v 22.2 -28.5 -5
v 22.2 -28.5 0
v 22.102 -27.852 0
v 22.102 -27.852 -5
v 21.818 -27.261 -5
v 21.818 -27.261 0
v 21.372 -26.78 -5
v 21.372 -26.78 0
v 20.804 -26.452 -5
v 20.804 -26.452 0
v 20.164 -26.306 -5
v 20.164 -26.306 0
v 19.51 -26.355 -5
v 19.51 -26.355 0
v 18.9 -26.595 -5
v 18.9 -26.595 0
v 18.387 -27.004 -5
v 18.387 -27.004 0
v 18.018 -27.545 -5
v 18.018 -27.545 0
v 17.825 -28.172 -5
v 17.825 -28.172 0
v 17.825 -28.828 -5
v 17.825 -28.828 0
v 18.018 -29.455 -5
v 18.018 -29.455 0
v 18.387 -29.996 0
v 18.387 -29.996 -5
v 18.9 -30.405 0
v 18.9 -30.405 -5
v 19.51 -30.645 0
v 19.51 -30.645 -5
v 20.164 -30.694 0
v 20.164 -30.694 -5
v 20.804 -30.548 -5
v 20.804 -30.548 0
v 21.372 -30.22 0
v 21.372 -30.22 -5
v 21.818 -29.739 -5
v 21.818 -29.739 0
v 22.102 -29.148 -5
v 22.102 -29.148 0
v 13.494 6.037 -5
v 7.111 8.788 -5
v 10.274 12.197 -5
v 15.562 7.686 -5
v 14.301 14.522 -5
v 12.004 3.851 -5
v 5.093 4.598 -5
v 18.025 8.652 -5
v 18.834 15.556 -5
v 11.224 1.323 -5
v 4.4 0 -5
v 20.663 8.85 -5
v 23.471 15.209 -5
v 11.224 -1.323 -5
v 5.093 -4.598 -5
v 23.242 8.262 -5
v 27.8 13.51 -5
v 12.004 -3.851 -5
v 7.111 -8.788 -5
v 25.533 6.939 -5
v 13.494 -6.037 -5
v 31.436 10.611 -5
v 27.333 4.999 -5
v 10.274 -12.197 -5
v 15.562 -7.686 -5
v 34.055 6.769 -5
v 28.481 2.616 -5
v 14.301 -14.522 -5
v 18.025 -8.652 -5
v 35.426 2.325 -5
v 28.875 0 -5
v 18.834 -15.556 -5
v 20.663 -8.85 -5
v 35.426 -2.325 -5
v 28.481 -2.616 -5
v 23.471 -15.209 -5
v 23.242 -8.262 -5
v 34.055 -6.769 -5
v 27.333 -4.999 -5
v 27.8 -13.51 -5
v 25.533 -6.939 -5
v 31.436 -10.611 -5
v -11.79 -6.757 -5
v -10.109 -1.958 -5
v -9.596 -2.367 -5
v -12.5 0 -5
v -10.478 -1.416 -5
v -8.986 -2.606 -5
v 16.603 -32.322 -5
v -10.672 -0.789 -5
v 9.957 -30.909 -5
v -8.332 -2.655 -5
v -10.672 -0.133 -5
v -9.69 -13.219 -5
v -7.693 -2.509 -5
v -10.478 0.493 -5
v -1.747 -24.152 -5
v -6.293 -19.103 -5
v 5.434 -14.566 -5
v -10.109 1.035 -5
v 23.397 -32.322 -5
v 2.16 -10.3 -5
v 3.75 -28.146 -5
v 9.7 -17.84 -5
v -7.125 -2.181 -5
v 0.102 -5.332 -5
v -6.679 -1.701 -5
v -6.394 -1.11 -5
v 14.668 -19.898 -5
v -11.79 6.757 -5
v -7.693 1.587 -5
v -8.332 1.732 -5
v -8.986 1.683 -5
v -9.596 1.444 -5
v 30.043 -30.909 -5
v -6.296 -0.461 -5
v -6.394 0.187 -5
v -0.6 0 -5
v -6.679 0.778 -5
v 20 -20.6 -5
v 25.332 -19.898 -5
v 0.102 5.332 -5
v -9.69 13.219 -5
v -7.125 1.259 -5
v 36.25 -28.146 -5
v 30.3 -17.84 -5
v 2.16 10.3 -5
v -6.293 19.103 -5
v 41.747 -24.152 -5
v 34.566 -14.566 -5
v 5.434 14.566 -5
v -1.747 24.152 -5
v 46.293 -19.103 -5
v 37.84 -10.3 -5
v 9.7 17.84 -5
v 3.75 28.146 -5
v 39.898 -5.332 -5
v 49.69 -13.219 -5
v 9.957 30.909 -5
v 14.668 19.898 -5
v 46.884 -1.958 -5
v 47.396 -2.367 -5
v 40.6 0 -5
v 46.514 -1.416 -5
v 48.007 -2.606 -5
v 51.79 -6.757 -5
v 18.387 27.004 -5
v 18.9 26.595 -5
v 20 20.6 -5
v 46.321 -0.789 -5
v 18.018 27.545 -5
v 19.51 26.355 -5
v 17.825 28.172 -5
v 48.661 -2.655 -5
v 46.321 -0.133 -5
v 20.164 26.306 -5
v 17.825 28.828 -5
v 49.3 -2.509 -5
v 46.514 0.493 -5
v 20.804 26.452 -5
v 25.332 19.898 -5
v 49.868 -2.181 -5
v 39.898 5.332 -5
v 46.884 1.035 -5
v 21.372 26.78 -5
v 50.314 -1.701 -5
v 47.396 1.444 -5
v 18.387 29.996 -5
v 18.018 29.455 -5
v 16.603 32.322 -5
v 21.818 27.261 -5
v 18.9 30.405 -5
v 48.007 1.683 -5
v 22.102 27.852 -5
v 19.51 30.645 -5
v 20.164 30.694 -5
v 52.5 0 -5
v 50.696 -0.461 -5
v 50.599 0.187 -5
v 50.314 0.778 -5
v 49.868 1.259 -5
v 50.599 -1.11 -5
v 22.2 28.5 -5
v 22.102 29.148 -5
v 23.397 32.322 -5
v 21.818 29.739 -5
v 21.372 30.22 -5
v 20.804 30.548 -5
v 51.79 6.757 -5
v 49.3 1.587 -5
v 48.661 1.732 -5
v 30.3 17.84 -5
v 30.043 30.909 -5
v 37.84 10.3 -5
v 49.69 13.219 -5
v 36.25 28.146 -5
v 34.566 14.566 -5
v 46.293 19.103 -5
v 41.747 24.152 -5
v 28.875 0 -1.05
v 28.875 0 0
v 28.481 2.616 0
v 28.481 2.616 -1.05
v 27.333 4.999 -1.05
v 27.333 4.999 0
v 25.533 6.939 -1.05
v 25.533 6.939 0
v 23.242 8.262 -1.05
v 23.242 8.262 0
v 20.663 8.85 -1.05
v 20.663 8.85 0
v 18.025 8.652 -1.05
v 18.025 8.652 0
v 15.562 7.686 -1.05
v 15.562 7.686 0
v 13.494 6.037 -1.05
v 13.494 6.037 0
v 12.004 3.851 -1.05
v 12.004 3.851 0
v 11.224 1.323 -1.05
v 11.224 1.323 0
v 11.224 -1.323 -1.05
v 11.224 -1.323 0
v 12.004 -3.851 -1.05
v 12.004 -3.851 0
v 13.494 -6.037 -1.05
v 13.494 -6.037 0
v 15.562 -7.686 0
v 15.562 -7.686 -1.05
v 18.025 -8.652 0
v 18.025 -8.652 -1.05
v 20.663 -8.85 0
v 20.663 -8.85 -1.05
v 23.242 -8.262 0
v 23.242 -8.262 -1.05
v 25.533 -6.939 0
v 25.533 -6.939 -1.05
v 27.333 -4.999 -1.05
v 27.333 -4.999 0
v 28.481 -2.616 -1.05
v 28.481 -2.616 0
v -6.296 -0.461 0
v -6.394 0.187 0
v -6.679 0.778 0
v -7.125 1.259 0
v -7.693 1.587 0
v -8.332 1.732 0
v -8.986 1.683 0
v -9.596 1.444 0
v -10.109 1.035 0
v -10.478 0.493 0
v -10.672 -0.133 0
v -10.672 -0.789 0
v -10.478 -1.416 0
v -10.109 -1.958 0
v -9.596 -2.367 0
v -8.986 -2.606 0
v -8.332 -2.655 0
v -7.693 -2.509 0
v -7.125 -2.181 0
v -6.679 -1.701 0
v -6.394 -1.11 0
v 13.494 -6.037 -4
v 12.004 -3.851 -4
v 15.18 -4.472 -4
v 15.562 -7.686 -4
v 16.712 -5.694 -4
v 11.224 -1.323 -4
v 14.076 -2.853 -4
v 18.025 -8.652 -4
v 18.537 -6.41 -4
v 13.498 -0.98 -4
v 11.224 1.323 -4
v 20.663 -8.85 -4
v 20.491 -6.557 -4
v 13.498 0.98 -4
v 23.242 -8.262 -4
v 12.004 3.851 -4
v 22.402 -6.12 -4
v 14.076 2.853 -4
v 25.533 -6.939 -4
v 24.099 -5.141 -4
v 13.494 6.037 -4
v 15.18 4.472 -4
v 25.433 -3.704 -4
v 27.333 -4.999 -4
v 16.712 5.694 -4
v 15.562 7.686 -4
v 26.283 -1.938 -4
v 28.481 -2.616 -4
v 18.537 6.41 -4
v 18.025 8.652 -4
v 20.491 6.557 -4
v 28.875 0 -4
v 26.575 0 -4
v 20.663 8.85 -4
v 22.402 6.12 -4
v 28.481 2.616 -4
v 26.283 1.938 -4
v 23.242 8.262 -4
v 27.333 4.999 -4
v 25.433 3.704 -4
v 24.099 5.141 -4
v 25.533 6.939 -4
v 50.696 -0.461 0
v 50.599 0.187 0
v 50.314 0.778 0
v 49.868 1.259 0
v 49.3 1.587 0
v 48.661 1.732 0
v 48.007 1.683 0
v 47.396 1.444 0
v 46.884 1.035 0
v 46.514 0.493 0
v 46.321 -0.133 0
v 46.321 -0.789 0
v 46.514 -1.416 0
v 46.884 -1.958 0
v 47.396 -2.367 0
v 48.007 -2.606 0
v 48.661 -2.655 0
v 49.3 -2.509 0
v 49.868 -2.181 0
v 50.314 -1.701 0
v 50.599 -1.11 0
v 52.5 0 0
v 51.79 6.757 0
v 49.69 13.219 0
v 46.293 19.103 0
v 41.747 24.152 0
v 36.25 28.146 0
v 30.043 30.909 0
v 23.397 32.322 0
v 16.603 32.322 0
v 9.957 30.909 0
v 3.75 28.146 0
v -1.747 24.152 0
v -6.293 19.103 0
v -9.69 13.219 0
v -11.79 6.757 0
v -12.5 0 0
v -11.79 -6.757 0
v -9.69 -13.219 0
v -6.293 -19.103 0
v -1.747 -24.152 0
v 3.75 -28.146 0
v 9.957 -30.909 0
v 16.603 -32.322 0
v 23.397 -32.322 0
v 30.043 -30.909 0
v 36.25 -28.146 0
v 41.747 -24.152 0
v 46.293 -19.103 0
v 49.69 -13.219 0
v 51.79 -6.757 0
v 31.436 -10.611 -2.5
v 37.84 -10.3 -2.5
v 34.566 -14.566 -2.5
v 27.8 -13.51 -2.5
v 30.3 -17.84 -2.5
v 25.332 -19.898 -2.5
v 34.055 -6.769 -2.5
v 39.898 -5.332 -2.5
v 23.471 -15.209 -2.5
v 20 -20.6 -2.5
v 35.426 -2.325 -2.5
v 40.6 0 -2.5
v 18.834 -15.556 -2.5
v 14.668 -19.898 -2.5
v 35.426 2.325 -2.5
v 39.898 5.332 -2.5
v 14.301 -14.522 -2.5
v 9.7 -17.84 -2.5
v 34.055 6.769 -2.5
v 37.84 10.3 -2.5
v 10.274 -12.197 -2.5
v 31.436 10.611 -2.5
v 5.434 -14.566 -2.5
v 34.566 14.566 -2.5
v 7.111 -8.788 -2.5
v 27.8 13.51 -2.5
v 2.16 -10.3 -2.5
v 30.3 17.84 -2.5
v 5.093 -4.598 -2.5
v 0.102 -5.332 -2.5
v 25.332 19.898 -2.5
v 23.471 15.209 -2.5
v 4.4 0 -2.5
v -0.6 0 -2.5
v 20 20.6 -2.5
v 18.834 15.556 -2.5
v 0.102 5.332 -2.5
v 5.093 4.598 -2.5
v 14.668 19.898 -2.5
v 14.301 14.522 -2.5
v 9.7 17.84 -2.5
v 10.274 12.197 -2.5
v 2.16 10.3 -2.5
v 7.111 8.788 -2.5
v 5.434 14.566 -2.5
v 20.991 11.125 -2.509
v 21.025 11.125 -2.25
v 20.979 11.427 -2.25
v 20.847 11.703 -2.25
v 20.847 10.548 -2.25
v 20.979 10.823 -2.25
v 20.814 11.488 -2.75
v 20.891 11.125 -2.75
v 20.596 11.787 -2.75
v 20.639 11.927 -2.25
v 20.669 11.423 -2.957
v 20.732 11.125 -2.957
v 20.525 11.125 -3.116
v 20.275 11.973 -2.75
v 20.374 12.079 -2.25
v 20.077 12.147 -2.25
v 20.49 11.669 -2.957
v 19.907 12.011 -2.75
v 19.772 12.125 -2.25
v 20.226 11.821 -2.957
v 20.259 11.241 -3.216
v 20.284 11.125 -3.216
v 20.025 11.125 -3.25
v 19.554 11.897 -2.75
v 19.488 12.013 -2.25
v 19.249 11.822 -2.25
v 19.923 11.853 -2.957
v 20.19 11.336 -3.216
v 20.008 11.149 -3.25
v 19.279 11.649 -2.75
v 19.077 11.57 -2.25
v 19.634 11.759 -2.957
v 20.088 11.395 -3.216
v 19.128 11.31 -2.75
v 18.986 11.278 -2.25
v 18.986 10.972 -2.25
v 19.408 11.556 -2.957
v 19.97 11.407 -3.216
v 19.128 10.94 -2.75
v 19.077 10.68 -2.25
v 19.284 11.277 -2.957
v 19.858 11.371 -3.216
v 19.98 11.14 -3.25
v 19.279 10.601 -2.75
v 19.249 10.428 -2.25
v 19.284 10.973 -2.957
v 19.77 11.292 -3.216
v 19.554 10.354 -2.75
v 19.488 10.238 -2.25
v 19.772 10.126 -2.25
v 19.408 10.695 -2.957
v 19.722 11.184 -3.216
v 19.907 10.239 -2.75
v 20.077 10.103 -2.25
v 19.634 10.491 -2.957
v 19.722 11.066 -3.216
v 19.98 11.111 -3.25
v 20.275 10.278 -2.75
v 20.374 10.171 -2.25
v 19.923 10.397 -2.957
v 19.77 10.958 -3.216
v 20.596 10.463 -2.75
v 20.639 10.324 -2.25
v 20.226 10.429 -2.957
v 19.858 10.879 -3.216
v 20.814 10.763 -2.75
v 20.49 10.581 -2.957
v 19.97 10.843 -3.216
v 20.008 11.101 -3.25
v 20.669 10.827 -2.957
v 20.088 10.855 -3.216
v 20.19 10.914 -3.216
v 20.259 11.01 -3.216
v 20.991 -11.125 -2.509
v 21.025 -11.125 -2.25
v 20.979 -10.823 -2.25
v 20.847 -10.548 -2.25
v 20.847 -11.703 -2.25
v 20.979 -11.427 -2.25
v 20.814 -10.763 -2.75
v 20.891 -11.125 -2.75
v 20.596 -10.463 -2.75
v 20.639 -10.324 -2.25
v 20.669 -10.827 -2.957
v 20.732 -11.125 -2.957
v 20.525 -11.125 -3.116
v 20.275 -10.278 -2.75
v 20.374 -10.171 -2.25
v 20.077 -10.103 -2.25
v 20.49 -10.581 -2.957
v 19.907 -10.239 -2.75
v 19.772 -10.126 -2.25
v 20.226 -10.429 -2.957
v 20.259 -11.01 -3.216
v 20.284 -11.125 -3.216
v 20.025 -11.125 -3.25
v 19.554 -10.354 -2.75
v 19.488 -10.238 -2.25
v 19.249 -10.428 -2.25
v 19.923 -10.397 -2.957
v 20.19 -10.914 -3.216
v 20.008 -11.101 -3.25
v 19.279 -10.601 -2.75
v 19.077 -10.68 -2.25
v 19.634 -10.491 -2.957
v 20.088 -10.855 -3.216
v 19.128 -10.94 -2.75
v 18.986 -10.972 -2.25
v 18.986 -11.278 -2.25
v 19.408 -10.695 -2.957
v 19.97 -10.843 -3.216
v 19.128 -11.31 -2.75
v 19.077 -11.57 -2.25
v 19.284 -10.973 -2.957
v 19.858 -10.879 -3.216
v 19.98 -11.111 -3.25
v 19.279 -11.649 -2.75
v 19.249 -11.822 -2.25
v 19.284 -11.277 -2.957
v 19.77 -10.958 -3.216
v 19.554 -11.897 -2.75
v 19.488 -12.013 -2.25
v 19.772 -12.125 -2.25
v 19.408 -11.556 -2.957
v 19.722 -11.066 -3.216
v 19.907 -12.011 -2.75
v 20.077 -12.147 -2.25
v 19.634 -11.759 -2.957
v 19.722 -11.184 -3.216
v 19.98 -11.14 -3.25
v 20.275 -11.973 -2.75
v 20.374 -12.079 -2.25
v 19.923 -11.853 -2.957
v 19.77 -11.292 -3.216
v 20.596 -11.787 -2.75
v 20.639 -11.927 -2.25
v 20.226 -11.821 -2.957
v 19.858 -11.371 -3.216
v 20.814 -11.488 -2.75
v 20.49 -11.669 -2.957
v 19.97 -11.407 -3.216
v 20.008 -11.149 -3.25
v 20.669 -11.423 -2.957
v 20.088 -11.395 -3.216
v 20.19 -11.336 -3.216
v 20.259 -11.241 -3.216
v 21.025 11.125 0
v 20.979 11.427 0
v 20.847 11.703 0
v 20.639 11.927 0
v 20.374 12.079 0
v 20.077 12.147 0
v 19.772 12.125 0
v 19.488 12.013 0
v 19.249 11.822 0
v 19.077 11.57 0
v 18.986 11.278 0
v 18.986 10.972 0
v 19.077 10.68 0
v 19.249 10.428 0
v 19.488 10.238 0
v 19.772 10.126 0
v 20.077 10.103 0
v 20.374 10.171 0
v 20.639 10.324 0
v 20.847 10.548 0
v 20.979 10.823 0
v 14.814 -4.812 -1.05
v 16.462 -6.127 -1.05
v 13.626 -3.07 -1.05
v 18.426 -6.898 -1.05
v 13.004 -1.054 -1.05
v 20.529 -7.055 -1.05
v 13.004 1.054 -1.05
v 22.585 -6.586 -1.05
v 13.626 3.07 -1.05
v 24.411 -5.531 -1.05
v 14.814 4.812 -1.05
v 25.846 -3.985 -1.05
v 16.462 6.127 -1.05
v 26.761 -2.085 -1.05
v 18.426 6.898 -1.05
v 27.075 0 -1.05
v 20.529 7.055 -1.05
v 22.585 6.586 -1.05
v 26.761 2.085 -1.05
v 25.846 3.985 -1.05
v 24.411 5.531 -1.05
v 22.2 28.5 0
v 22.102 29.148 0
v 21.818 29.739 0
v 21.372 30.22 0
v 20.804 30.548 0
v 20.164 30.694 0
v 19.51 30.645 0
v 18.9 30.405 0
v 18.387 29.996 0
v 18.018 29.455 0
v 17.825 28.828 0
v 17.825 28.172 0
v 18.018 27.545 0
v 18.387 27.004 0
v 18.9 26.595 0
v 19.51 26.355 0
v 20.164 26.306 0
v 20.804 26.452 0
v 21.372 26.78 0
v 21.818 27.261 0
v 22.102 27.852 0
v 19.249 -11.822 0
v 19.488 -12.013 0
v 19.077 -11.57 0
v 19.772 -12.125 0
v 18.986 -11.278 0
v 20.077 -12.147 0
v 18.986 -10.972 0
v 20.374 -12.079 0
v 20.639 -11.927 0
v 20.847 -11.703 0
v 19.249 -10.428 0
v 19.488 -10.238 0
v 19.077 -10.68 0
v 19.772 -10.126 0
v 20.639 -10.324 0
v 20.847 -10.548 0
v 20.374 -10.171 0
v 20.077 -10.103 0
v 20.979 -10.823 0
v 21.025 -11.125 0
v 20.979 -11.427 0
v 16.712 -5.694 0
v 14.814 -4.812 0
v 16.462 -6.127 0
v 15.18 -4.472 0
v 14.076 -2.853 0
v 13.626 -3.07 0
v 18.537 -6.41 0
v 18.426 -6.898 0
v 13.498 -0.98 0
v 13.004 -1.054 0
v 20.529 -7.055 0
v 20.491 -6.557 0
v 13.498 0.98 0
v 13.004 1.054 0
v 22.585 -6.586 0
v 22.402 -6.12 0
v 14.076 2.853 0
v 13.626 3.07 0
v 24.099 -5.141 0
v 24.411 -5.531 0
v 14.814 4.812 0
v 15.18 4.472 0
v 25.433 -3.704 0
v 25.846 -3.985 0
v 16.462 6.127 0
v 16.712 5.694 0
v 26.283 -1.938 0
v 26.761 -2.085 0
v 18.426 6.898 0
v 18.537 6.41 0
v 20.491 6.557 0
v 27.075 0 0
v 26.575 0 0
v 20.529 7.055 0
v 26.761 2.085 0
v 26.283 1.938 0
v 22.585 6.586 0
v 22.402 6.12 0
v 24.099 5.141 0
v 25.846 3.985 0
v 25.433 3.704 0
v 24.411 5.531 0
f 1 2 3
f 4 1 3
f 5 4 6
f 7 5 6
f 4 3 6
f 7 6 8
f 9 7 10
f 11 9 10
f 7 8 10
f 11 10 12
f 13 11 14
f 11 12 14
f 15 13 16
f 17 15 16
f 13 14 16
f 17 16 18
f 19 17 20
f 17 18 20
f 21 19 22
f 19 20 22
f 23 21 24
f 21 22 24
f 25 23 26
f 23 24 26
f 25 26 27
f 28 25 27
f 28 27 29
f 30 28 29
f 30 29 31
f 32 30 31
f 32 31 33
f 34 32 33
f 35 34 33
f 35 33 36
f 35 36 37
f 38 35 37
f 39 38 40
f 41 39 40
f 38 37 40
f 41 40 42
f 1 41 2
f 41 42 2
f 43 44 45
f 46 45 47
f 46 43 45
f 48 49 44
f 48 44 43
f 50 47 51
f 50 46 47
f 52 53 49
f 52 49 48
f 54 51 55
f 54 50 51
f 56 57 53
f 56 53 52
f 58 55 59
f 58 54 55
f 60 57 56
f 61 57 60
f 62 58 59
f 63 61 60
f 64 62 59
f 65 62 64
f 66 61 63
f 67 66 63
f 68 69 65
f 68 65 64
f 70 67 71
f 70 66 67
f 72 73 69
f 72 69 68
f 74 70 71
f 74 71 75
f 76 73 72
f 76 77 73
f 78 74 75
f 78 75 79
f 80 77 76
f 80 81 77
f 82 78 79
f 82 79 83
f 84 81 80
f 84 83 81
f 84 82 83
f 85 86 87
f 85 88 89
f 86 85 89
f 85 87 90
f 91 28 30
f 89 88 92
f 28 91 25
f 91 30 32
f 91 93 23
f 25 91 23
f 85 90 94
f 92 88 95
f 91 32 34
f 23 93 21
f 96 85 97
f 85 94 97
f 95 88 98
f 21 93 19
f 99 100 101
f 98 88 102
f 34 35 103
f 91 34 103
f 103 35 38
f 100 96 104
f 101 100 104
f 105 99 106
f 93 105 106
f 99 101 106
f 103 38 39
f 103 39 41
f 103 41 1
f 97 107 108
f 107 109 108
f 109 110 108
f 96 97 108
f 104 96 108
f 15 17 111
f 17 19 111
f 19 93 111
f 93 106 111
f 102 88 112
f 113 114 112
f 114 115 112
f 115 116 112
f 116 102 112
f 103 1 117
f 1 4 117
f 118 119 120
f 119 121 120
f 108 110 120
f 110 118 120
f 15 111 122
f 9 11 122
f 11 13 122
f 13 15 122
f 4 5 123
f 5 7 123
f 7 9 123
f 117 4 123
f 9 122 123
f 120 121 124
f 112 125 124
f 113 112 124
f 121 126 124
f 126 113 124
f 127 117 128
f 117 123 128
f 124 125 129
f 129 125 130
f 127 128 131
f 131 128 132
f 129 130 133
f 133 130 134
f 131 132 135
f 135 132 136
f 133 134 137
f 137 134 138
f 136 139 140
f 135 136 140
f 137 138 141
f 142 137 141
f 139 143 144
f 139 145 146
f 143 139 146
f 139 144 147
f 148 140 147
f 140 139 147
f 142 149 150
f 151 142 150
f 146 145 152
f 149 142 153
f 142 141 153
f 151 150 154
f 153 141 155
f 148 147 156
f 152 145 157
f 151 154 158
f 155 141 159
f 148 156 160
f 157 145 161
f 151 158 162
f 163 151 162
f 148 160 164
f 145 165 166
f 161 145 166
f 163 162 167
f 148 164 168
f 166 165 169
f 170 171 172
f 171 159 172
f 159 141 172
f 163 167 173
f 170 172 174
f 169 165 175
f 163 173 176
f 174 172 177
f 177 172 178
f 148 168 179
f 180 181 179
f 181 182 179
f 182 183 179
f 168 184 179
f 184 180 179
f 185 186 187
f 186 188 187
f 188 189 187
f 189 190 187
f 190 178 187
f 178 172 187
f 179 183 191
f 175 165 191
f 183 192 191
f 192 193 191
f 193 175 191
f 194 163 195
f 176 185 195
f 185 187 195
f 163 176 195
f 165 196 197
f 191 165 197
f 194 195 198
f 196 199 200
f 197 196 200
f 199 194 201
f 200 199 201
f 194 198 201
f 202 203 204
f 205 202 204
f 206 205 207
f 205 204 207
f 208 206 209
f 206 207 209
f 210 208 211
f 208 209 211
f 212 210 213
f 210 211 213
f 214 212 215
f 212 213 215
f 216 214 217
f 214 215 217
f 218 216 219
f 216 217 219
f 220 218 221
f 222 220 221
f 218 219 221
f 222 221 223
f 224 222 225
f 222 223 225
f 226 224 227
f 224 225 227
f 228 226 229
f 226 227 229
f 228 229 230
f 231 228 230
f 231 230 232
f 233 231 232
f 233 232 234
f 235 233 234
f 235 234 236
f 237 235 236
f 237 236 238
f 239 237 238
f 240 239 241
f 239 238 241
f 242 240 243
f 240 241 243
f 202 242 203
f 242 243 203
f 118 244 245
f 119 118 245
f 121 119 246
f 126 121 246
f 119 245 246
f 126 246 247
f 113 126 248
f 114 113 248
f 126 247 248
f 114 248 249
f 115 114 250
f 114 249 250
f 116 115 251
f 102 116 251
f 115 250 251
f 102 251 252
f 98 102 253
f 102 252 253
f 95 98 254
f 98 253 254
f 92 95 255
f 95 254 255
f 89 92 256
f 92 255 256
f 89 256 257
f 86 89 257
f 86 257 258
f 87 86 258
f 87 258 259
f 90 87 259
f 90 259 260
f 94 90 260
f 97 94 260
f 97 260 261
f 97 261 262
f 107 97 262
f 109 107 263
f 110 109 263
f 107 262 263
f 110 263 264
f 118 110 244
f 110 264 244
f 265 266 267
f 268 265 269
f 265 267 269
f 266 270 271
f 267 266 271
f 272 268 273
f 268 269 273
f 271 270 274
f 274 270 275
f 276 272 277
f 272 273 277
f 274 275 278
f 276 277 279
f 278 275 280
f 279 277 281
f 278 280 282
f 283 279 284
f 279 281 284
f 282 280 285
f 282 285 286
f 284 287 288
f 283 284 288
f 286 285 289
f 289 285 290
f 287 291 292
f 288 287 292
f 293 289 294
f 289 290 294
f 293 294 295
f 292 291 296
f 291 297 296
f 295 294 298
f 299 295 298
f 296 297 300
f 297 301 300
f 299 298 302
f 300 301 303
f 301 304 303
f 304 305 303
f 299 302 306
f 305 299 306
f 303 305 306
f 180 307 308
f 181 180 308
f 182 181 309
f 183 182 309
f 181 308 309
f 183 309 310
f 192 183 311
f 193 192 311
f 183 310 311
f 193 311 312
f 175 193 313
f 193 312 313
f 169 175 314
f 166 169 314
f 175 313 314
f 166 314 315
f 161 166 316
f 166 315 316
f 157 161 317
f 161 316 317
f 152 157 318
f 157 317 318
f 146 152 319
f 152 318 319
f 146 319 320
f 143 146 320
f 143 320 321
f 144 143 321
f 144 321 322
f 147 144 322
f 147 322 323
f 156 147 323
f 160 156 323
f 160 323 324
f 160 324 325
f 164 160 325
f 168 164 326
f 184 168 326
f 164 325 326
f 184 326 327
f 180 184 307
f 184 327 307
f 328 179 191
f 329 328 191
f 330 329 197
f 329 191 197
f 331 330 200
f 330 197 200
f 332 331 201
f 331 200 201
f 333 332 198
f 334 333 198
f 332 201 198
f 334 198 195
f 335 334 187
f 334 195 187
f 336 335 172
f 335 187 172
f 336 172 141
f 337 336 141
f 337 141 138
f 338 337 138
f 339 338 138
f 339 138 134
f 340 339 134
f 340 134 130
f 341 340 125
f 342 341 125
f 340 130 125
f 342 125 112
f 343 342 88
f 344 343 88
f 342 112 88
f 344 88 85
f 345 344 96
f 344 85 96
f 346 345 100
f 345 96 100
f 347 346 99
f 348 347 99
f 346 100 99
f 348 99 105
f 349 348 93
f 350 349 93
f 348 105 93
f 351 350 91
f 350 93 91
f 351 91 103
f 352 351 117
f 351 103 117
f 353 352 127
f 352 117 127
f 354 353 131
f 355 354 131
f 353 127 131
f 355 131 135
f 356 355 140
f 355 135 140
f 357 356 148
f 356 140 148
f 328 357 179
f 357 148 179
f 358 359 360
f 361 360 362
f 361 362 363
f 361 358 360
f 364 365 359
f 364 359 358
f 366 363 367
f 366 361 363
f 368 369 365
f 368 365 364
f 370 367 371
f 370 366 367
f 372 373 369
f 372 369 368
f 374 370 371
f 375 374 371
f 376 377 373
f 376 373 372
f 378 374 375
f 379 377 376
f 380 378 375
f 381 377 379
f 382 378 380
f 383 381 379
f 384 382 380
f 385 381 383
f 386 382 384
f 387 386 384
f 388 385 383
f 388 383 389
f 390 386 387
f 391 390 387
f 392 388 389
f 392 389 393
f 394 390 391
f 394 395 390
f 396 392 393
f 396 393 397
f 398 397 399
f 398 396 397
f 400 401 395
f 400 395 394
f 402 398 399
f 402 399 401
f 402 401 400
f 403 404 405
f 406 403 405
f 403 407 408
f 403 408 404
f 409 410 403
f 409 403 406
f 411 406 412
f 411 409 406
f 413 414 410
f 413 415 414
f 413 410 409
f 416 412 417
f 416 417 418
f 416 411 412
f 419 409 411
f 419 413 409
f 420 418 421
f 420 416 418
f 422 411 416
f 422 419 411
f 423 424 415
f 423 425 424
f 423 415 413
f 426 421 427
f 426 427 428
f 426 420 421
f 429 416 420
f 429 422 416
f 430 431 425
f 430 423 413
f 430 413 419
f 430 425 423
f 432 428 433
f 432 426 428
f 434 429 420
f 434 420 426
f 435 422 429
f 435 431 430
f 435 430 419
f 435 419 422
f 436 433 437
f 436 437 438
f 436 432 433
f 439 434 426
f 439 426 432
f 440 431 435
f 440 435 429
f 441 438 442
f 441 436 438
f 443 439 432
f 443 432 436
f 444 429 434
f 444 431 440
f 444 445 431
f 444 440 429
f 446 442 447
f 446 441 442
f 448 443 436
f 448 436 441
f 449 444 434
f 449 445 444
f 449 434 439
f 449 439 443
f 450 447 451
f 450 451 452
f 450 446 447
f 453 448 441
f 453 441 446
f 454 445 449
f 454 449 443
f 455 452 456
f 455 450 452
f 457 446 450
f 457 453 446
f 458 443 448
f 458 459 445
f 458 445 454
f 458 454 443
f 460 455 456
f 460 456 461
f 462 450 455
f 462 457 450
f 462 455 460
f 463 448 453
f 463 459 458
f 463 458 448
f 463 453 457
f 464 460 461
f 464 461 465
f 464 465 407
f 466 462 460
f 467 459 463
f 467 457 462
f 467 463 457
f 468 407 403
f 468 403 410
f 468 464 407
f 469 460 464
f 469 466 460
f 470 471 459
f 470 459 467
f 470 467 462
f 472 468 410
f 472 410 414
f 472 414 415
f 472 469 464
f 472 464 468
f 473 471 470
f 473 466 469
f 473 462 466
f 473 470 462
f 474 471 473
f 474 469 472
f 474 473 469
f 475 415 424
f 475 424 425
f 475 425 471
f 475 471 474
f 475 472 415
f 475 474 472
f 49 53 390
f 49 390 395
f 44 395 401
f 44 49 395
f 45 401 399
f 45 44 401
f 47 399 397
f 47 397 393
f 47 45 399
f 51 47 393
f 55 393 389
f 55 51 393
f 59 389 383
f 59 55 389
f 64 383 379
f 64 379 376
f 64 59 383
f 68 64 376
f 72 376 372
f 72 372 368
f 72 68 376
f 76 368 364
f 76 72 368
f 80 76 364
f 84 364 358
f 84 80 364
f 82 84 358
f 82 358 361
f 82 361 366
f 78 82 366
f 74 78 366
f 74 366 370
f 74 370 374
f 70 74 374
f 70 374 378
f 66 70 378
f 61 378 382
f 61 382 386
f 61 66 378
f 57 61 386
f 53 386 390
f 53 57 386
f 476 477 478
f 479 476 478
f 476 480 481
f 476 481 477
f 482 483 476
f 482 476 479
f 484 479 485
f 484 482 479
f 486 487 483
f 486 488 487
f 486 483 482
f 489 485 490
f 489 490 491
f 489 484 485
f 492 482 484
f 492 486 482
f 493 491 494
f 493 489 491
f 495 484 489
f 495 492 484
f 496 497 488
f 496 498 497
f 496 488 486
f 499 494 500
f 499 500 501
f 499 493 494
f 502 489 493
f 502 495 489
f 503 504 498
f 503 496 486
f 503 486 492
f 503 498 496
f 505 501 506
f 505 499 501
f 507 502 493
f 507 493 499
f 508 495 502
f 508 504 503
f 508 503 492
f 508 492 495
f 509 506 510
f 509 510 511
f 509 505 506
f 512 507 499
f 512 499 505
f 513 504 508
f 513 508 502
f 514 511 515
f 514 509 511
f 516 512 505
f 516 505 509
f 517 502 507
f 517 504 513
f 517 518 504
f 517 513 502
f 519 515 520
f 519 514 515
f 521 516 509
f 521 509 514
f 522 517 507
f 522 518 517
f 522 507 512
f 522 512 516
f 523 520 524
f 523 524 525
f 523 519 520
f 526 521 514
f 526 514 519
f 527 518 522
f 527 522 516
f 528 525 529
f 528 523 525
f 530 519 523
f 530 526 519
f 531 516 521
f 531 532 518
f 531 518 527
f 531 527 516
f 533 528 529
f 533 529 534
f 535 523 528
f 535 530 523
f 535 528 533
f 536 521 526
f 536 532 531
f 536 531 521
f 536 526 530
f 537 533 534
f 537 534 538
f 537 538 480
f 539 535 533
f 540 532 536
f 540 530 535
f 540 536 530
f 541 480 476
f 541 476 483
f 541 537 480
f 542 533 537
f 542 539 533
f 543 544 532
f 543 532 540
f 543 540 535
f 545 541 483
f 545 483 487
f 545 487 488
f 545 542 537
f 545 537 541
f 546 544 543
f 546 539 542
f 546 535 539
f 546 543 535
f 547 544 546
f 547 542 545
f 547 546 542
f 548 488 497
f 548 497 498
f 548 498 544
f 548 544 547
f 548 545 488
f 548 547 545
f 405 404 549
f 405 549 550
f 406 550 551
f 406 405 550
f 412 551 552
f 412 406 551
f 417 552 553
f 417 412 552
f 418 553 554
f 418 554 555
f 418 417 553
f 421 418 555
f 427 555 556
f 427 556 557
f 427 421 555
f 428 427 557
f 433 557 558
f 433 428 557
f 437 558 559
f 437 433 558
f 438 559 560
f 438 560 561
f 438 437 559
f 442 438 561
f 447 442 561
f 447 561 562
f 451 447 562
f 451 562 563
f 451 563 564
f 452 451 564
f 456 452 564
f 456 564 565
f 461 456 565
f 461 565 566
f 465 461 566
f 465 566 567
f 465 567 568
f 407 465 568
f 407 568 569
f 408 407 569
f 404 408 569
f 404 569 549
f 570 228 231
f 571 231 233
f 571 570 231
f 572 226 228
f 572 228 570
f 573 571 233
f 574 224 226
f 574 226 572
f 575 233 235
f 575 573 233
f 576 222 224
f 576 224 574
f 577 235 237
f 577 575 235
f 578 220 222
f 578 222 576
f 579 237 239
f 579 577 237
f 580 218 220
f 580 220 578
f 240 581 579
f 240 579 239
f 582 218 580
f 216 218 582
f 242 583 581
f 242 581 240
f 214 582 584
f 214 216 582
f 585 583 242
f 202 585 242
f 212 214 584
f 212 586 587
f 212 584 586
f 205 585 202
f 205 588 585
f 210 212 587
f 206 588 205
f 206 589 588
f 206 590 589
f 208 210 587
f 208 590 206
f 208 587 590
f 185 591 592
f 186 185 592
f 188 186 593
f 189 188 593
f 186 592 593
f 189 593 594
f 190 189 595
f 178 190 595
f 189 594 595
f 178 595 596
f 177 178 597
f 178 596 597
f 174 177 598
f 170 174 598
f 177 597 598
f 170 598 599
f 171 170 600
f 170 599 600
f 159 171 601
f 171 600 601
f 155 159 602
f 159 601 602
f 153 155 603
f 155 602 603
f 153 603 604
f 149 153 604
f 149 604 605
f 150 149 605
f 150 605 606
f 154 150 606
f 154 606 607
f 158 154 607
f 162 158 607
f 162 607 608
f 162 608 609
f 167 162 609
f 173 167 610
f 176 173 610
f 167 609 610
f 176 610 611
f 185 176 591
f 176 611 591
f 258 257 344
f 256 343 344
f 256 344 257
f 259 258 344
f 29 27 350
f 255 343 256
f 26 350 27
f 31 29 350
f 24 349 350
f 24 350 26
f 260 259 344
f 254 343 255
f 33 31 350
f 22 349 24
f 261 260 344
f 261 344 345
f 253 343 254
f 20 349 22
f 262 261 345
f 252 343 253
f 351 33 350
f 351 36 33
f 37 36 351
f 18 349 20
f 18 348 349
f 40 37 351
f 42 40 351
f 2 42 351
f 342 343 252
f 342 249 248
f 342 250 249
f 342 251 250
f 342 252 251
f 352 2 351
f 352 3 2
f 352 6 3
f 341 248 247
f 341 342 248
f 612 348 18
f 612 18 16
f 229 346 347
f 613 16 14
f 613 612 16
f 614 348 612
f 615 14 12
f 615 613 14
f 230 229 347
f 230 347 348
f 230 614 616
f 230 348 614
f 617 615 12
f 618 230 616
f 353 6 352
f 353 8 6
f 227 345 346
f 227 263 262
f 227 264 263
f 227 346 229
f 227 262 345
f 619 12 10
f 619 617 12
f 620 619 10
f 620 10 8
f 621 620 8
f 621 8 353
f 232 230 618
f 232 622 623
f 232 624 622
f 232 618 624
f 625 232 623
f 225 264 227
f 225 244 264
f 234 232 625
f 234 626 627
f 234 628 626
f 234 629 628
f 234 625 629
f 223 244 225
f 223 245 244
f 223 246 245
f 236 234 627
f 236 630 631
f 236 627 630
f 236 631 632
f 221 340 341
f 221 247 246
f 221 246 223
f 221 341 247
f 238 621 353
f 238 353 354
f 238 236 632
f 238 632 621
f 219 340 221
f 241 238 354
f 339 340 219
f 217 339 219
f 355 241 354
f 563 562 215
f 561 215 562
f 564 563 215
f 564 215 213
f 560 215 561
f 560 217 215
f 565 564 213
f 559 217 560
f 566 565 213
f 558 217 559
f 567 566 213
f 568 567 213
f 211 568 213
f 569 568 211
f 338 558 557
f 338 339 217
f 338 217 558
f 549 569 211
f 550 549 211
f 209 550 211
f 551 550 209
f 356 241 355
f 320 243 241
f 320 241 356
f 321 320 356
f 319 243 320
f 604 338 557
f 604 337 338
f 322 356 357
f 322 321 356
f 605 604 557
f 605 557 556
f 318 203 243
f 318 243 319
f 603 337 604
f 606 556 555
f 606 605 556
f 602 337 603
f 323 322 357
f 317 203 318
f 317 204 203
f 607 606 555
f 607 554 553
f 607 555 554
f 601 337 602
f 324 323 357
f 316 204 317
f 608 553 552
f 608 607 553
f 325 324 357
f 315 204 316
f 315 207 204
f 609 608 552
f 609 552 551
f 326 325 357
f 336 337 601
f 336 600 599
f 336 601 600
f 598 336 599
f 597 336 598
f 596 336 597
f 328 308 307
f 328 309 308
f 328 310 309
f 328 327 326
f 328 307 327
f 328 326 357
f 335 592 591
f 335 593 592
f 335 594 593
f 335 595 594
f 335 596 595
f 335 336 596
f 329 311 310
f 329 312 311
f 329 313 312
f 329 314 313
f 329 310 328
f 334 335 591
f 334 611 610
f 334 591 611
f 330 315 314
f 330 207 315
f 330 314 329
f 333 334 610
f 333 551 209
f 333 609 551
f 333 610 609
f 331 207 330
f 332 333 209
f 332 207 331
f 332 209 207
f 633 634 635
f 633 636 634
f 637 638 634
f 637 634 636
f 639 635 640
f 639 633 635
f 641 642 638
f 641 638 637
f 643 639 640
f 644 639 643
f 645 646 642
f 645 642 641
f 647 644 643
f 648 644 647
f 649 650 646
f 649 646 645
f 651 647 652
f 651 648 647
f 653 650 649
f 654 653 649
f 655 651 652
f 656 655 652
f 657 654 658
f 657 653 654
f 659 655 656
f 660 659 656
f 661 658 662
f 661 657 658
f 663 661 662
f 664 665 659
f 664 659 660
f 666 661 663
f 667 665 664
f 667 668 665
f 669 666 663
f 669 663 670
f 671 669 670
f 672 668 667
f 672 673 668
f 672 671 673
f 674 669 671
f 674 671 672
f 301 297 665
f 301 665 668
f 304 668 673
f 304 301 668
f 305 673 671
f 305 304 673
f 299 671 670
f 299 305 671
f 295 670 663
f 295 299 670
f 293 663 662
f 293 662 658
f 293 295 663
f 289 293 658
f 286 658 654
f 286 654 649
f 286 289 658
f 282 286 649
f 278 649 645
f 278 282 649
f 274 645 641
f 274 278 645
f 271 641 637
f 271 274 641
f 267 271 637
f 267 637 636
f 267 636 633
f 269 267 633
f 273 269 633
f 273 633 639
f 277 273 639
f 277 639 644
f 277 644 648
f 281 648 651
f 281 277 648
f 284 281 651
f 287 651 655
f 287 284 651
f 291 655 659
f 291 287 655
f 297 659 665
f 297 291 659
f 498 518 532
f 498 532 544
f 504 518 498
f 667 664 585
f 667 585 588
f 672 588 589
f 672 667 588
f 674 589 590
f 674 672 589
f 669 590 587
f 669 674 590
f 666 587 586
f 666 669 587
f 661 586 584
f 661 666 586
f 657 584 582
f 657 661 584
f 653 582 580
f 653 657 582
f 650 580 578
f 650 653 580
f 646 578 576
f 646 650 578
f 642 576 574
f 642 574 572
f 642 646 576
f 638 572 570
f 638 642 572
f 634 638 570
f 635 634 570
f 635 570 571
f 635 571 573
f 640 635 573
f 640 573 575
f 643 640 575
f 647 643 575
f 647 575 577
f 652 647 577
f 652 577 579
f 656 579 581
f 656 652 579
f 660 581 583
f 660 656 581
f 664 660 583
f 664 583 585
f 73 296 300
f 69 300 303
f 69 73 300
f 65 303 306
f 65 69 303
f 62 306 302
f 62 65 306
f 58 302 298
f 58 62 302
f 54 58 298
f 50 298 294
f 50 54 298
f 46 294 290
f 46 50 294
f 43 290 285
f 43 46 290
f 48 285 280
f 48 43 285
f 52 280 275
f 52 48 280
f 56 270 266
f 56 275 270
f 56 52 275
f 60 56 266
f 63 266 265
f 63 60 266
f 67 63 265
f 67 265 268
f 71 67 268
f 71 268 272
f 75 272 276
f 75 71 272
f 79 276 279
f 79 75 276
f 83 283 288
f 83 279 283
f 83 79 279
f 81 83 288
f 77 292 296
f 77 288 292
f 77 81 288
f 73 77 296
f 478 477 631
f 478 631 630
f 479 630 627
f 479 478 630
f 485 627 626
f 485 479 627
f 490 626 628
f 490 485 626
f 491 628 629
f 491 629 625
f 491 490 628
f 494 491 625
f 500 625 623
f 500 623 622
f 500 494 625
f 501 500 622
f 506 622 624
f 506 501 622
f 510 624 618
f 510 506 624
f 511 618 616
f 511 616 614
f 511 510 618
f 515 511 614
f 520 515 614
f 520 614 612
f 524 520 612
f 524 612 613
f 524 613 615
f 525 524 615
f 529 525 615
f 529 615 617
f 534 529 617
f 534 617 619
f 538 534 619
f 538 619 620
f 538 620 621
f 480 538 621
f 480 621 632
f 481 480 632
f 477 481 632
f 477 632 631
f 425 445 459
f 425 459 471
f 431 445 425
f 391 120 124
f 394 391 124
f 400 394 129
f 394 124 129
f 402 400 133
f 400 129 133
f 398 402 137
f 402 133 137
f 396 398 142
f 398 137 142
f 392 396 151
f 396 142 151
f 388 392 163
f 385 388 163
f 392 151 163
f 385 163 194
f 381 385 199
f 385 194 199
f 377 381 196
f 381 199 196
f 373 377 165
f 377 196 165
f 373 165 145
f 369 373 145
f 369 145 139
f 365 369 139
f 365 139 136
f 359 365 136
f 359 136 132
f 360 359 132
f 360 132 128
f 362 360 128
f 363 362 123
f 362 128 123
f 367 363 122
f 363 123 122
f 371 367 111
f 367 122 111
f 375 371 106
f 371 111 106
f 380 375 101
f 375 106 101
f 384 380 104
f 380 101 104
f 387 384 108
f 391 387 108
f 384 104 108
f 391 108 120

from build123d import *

# Parameters (mm, degrees)
BOSS_EXTRUDE1_START       = -4
BOSS_EXTRUDE1_OUTLINE_R   = 2.2
BOSS_EXTRUDE1_OUTLINE_R_2 = 1.025
BOSS_EXTRUDE1_OUTLINE_R_3 = 6.575
BOSS_EXTRUDE1_DEPTH       = 4
SKETCH3_R                 = 8.875
SKETCH3_R_2               = 7.075
CUT_EXTRUDE1_DEPTH        = 1.05
BOSS_EXTRUDE2_START       = -4
SKETCH4_R                 = 1.025
BOSS_EXTRUDE2_DEPTH       = 0.75
FILLET1_R                 = 1
BOSS_EXTRUDE3_START       = -5
SKETCH5_R                 = 32.5
SKETCH5_R_2               = 1.025
SKETCH5_R_3               = 8.875
BOSS_EXTRUDE3_DEPTH       = 5
SKETCH6_R                 = 2.2
CUT_EXTRUDE2_DEPTH        = 5
SKETCH7_R                 = 20.6
SKETCH7_R_2               = 15.6
CUT_EXTRUDE3_DEPTH        = 2.5
BOSS_EXTRUDE4_START       = 1
SKETCH8_R                 = 1.025
BOSS_EXTRUDE4_DEPTH       = 1


# Read off the part's stored shape, not the designer's step: Boss-Extrude1
with BuildPart() as part:
    # Boss-Extrude1 outline → Boss-Extrude1 (new body)
    with BuildSketch(Plane.XY.offset(BOSS_EXTRUDE1_START)):
        with BuildLine():
            Line((-5.8, 12.8), (-5.8, -12.8))
            ThreePointArc((-5.8, -12.8), (-1.992388155, -21.992388155), (7.2, -25.8))
            Line((7.2, -25.8), (32.8, -25.8))
            ThreePointArc((32.8, -25.8), (41.992388155, -21.992388155), (45.8, -12.8))
            Line((45.8, -12.8), (45.8, 12.8))
            ThreePointArc((45.8, 12.8), (41.992388155, 21.992388155), (32.8, 25.8))
            Line((32.8, 25.8), (7.2, 25.8))
            ThreePointArc((7.2, 25.8), (-1.992388155, 21.992388155), (-5.8, 12.8))
        make_face()
        with Locations((25, -22)):
            Circle(BOSS_EXTRUDE1_OUTLINE_R, mode=Mode.SUBTRACT)
        with Locations((20, -11.1252)):
            Circle(BOSS_EXTRUDE1_OUTLINE_R_2, mode=Mode.SUBTRACT)
        with Locations((-2, 0)):
            Circle(BOSS_EXTRUDE1_OUTLINE_R, mode=Mode.SUBTRACT)
        with Locations((20, 0)):
            Circle(BOSS_EXTRUDE1_OUTLINE_R_3, mode=Mode.SUBTRACT)
        with Locations((20, 11.1252)):
            Circle(BOSS_EXTRUDE1_OUTLINE_R_2, mode=Mode.SUBTRACT)
        with Locations((42, 0)):
            Circle(BOSS_EXTRUDE1_OUTLINE_R, mode=Mode.SUBTRACT)
        with Locations((25, 22)):
            Circle(BOSS_EXTRUDE1_OUTLINE_R, mode=Mode.SUBTRACT)
    extrude(amount=BOSS_EXTRUDE1_DEPTH)

    # Sketch3 → Cut-Extrude1 (cut)
    with BuildSketch(Plane.XY):
        with Locations((20, 0)):
            Circle(SKETCH3_R)
        with Locations((20, 0)):
            Circle(SKETCH3_R_2, mode=Mode.SUBTRACT)
    extrude(amount=-CUT_EXTRUDE1_DEPTH, mode=Mode.SUBTRACT)

    # Sketch4 → Boss-Extrude2 (add)
    with BuildSketch(Plane.XY.offset(BOSS_EXTRUDE2_START)):
        with Locations((20, 11.1252)):
            Circle(SKETCH4_R)
        with Locations((20, -11.1252)):
            Circle(SKETCH4_R)
    extrude(amount=BOSS_EXTRUDE2_DEPTH)

    # Fillet1
    fillet1_edges = [part.edges().sort_by_distance(p)[0] for p in [
        (18.975, 11.1252, -3.25),
        (18.975, -11.1252, -3.25),
    ]]
    fillet(fillet1_edges, radius=FILLET1_R)

    # Sketch5 → Boss-Extrude3 (add)
    with BuildSketch(Plane.XY.offset(BOSS_EXTRUDE3_START)):
        with Locations((20, 0)):
            Circle(SKETCH5_R)
        with Locations((20, -11.1252)):
            Circle(SKETCH5_R_2, mode=Mode.SUBTRACT)
        with Locations((20, 11.1252)):
            Circle(SKETCH5_R_2, mode=Mode.SUBTRACT)
        with Locations((20, 0)):
            Circle(SKETCH5_R_3, mode=Mode.SUBTRACT)
    extrude(amount=BOSS_EXTRUDE3_DEPTH)

    # Sketch6 → Cut-Extrude2 (cut)
    with BuildSketch(Plane.XY):
        with Locations((-8.496265533, -0.461357402)):
            Circle(SKETCH6_R)
        with Locations((20, 28.5)):
            Circle(SKETCH6_R)
        with Locations((48.496265533, -0.461357402)):
            Circle(SKETCH6_R)
        with Locations((20, -28.5)):
            Circle(SKETCH6_R)
    extrude(amount=-CUT_EXTRUDE2_DEPTH, mode=Mode.SUBTRACT)

    # Sketch7 → Cut-Extrude3 (cut)
    with BuildSketch(Plane(origin=(0, 0, -5), x_dir=(-1, 0, 0), z_dir=(0, 0, -1))):
        with Locations((-20, 0)):
            Circle(SKETCH7_R)
        with Locations((-20, 0)):
            Circle(SKETCH7_R_2, mode=Mode.SUBTRACT)
    extrude(amount=-CUT_EXTRUDE3_DEPTH, mode=Mode.SUBTRACT)

    # Sketch8 → Boss-Extrude4 (add)
    with BuildSketch(Plane(origin=(0, 0, -4), x_dir=(-1, 0, 0), z_dir=(0, 0, -1)).offset(BOSS_EXTRUDE4_START)):
        with Locations(Location((-20, -11.1252, 0), (0, 0, 180))):
            Circle(SKETCH8_R)
        with Locations(Location((-20, 11.1252, 0), (0, 0, 180))):
            Circle(SKETCH8_R)
    extrude(amount=-BOSS_EXTRUDE4_DEPTH)


solid = part.part
